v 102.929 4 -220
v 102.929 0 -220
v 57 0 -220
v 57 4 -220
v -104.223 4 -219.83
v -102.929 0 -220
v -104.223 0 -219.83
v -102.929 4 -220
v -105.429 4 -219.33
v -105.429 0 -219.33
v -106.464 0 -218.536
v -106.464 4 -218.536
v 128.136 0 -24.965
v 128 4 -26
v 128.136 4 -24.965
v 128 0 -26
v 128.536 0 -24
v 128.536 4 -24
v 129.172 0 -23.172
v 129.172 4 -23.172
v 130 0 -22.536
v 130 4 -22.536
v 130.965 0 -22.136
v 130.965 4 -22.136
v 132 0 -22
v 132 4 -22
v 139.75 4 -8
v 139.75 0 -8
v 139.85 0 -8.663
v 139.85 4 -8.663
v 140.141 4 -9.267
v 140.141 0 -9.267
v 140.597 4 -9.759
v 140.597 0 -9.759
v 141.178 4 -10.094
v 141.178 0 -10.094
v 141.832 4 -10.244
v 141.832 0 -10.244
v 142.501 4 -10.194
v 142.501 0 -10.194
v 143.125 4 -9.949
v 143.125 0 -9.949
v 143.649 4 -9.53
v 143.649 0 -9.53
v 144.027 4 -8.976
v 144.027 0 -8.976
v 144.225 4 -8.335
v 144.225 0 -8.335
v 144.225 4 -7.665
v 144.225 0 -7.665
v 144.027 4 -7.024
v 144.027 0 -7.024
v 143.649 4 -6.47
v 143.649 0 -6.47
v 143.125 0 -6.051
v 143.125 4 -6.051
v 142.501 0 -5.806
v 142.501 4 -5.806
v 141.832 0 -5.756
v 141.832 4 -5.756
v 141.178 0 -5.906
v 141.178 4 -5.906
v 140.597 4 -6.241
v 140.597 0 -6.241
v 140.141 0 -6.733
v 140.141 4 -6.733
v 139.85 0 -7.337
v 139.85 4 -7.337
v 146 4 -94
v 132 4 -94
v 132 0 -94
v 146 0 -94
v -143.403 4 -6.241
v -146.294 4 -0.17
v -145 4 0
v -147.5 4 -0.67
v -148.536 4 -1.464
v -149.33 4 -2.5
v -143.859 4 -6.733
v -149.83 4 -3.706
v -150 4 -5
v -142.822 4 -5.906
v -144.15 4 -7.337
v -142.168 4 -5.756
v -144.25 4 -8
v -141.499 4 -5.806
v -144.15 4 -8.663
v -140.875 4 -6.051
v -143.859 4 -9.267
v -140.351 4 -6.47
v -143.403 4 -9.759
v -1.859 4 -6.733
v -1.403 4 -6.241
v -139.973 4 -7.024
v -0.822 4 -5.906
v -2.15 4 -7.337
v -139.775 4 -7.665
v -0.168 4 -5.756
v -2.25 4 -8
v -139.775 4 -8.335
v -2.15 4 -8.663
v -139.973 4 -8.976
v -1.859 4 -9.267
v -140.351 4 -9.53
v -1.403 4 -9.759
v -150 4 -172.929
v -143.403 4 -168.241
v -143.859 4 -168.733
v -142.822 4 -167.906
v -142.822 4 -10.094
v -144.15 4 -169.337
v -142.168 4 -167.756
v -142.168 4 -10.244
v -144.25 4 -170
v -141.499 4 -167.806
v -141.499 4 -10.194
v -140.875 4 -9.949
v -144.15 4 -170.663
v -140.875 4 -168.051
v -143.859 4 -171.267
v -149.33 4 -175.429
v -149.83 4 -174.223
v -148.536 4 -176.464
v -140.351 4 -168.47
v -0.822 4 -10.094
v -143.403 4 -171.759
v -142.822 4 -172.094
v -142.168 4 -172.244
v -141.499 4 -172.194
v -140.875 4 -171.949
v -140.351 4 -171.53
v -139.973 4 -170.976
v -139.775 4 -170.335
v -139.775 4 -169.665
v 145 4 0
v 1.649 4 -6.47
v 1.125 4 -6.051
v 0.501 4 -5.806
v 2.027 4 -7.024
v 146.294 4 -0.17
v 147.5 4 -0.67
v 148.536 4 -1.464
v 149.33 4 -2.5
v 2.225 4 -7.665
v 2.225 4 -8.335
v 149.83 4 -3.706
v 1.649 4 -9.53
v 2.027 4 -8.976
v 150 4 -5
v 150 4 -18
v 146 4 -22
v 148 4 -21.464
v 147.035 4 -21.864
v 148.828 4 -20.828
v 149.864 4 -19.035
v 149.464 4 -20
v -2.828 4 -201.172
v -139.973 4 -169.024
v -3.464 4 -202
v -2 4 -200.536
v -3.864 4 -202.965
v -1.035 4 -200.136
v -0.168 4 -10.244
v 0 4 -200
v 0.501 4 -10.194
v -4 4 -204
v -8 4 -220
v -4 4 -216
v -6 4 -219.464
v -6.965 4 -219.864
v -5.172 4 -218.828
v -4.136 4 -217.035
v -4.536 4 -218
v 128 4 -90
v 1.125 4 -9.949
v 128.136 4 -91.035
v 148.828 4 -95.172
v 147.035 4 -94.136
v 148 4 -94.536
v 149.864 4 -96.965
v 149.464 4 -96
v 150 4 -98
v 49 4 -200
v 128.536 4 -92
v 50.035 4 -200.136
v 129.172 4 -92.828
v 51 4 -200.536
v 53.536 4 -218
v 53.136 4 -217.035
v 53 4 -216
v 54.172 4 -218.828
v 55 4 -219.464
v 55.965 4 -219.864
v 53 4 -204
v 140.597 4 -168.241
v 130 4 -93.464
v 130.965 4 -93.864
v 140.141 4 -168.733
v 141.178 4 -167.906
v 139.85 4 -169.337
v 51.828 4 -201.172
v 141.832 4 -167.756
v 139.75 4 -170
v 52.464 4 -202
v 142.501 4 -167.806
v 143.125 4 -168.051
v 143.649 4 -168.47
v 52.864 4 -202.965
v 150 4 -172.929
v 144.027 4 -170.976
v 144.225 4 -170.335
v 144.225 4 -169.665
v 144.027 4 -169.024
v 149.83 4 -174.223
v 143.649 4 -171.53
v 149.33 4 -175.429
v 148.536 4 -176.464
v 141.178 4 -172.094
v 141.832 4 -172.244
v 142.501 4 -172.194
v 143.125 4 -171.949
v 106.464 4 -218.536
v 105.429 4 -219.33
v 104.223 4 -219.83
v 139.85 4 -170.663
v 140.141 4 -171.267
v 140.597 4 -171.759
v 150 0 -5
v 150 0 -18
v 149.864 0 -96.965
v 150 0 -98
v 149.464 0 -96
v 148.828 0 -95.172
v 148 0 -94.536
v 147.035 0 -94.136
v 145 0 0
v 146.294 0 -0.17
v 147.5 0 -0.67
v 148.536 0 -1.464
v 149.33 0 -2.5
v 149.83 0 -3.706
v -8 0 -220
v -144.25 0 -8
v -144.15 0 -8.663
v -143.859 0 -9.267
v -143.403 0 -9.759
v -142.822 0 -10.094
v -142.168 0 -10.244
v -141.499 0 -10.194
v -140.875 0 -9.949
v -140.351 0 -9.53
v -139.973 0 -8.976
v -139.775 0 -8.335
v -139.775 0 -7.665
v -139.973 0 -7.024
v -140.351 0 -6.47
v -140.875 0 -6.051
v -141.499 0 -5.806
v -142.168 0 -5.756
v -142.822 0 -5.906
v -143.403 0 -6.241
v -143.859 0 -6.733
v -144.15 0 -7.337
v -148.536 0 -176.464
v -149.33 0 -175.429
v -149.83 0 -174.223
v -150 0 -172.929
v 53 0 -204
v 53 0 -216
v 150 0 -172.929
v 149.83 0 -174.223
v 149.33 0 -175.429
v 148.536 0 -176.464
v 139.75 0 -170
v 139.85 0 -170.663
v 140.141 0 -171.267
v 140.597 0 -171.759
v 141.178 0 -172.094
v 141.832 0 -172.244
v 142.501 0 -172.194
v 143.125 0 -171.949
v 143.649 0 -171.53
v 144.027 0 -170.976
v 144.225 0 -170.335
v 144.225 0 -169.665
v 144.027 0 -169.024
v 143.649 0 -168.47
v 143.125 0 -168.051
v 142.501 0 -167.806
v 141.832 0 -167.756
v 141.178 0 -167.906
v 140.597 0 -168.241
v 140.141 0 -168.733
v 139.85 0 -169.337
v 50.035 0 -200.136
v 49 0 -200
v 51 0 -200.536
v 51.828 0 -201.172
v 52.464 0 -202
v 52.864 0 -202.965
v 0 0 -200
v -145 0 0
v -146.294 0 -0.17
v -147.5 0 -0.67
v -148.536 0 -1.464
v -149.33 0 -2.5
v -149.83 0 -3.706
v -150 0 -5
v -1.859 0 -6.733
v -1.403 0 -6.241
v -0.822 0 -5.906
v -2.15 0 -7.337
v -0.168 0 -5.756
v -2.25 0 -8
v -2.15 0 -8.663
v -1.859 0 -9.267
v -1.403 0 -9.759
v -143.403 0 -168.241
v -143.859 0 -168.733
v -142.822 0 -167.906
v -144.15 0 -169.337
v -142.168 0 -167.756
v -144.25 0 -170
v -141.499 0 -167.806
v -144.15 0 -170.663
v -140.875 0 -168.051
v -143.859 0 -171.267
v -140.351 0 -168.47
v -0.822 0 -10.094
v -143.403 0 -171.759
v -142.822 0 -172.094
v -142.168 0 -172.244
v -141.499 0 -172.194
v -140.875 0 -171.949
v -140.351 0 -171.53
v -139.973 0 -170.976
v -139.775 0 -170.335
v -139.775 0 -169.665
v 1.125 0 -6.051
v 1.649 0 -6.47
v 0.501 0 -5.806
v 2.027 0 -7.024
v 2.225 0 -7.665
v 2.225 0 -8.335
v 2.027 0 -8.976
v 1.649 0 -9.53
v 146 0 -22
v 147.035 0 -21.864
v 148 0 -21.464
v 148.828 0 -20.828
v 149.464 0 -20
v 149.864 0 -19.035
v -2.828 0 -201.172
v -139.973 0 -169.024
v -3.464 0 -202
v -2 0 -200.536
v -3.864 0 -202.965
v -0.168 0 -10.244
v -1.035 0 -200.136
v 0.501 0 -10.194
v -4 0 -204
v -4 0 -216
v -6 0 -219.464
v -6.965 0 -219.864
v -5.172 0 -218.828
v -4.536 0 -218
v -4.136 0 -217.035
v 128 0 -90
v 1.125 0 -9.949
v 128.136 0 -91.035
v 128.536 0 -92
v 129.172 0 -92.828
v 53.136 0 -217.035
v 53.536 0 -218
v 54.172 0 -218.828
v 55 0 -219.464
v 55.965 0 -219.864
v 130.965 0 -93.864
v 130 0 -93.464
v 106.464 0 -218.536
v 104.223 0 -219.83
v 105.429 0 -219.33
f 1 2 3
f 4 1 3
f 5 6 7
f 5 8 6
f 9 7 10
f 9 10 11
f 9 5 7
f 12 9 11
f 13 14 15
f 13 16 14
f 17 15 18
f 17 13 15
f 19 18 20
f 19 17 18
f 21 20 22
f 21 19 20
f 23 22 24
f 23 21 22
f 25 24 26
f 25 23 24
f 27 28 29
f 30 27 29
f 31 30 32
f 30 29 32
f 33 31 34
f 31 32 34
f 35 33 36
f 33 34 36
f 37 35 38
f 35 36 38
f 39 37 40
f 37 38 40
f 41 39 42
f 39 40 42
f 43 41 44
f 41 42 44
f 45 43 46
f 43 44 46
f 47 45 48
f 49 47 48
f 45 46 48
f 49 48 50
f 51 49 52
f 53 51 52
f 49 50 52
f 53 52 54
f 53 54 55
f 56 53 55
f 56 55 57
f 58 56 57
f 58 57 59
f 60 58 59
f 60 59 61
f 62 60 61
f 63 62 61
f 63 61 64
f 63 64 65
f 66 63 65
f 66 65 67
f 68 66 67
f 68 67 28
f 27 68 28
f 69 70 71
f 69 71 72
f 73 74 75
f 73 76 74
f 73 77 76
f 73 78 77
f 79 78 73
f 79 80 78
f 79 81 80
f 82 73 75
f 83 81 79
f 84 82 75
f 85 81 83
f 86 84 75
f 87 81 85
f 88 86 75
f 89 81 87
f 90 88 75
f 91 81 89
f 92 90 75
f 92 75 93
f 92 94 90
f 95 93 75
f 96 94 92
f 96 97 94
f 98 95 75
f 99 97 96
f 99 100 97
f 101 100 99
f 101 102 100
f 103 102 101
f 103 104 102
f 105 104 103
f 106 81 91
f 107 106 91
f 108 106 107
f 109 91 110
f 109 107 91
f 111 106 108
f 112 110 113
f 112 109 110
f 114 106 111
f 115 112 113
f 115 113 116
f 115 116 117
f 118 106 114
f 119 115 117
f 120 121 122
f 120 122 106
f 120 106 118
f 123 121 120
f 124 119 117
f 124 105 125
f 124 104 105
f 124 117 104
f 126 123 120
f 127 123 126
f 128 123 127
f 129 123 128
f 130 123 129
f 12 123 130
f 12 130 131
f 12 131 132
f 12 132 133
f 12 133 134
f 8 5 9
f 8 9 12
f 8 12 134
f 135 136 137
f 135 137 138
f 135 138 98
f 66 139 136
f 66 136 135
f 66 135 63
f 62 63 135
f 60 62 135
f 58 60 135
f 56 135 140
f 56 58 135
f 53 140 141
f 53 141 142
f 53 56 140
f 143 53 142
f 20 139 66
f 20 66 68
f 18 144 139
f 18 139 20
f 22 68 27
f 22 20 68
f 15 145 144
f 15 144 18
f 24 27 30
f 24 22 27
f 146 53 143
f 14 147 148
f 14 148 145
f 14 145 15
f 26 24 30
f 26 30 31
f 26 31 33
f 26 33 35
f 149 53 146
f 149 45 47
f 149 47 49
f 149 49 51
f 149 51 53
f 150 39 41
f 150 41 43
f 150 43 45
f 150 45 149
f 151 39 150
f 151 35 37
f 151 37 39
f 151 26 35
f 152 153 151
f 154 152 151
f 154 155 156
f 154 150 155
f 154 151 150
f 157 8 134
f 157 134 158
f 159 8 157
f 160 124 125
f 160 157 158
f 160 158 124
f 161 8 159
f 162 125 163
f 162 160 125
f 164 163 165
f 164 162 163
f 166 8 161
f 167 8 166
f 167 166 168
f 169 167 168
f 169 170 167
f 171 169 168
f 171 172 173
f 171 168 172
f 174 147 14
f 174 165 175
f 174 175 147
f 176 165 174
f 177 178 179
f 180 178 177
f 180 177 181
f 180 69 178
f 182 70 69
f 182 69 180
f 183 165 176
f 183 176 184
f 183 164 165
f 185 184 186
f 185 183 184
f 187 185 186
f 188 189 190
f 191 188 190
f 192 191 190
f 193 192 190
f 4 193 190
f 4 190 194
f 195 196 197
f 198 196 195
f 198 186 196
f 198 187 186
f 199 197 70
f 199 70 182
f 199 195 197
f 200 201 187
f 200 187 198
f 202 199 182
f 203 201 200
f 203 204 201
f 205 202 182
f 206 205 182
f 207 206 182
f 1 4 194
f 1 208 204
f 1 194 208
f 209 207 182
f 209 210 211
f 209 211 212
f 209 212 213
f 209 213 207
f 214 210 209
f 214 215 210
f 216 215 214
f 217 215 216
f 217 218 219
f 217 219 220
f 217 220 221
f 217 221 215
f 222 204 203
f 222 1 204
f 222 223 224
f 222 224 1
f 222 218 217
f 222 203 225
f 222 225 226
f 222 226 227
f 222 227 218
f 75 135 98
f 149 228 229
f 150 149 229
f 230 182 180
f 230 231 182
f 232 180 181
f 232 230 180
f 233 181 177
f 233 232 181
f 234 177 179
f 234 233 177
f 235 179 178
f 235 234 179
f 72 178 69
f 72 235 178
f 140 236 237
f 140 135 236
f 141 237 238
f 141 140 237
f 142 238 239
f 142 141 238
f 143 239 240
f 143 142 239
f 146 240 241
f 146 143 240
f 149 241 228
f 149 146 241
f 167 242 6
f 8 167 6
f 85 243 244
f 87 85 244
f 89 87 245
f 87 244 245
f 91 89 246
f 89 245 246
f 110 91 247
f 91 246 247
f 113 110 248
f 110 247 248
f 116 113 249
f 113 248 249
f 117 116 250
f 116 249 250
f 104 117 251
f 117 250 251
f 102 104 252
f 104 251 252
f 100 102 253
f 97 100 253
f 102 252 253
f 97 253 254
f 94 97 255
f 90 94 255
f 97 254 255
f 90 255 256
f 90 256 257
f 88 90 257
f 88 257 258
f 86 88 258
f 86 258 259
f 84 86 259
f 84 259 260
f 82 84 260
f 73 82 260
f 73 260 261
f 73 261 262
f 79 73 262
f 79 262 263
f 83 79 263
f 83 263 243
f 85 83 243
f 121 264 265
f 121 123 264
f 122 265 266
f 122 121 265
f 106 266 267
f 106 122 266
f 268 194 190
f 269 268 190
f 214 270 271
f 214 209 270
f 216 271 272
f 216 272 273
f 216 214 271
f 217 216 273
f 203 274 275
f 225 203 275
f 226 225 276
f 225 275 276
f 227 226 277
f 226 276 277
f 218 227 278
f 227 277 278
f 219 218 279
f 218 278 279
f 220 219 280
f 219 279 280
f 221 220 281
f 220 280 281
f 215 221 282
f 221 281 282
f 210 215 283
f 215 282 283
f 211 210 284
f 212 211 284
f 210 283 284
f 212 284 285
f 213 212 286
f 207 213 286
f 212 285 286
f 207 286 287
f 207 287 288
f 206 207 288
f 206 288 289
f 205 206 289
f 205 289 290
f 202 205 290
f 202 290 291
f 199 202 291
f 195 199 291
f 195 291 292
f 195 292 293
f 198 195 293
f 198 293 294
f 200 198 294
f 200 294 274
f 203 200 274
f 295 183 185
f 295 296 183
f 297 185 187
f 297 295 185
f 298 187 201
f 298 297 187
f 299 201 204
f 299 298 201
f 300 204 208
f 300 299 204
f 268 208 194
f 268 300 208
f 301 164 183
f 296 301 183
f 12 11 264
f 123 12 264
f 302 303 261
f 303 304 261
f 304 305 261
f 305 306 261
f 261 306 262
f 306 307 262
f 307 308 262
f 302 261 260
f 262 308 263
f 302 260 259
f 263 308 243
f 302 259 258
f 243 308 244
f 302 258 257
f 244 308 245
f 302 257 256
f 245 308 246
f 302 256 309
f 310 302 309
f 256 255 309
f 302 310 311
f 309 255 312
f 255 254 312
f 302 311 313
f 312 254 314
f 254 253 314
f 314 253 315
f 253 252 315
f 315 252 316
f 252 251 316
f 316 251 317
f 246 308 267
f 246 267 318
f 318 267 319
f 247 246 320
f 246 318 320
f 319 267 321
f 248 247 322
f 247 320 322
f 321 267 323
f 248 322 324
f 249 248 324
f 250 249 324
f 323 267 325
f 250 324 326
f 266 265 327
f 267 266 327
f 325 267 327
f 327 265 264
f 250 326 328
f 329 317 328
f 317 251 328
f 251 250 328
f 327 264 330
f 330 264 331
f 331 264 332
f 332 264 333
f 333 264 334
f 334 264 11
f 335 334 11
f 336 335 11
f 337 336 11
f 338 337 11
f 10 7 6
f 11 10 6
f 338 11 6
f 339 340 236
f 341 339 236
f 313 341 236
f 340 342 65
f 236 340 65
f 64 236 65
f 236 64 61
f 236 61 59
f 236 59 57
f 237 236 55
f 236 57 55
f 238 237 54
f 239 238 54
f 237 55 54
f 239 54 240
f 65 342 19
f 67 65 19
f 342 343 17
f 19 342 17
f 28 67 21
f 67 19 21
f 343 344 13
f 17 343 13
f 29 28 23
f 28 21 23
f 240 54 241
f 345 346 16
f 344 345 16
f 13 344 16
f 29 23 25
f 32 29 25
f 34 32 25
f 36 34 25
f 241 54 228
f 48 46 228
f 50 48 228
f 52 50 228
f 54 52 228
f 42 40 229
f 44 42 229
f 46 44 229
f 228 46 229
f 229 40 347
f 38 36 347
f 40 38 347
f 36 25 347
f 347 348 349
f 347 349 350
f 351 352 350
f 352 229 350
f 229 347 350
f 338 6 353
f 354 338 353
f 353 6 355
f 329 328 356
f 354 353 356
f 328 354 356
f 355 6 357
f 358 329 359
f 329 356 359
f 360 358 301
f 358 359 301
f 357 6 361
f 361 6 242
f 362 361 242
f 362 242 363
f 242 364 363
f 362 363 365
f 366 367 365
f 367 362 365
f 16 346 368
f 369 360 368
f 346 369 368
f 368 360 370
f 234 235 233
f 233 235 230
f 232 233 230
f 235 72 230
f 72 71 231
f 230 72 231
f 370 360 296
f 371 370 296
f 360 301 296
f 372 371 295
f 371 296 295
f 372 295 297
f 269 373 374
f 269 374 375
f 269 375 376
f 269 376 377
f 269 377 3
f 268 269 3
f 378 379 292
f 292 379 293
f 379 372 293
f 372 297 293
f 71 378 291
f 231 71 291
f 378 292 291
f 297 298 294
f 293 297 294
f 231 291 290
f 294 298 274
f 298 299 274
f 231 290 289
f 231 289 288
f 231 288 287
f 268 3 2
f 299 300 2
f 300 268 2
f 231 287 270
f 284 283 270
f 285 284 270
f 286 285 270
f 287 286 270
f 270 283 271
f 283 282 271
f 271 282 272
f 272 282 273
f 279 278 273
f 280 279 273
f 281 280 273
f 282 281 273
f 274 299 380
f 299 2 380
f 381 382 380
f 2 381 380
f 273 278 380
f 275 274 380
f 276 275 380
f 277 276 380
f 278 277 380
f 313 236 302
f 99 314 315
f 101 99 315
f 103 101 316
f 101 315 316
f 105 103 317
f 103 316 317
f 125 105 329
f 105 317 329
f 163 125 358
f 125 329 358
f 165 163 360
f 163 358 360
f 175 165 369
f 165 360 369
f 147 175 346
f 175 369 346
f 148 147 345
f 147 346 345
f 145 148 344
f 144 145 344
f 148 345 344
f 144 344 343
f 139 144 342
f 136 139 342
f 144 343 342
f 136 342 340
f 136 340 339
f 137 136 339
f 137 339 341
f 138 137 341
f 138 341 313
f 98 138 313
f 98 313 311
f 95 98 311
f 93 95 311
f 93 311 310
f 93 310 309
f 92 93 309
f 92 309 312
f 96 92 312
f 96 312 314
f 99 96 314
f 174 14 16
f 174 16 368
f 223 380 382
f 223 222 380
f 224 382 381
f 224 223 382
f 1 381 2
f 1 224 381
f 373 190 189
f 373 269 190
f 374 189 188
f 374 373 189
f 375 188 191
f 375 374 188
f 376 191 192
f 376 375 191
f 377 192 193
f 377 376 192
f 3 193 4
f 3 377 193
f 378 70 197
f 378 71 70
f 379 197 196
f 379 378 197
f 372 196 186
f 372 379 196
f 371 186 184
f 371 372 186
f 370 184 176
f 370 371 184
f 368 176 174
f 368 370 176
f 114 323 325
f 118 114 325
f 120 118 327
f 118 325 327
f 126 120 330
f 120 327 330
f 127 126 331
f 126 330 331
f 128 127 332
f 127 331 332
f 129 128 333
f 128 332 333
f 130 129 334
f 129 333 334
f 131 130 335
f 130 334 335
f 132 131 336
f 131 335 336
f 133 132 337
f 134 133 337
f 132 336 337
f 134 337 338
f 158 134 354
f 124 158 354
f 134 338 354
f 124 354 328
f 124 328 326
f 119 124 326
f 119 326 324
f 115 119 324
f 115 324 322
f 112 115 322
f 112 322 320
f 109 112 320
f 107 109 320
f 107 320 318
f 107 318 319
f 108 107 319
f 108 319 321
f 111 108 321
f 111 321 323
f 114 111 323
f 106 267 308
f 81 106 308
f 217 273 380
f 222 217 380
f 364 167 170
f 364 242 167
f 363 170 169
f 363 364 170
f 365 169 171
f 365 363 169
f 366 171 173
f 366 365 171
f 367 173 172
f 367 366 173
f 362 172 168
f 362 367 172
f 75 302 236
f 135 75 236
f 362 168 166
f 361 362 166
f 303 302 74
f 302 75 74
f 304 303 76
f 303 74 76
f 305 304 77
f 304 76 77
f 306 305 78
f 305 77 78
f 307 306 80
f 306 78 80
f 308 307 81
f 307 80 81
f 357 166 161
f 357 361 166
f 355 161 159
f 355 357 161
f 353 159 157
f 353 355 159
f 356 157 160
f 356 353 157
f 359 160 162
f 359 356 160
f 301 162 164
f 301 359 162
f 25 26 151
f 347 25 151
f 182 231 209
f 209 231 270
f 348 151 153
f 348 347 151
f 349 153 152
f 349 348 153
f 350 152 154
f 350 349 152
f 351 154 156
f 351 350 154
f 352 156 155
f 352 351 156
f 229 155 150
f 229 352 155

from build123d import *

# Parameters (mm, degrees)
MAIN_EXTRUSION_DEPTH    = 4
CORNER_LEAVE_R          = 5
D_GAGEMENT_M41_D        = 4.5
ESQUISSE4_W             = 22
ESQUISSE4_H             = 72
ENL_V_MAT_EXTRU_1_DEPTH = 4
ENL_V_MAT_EXTRU_2_DEPTH = 4
CONG_1_R                = 4


with BuildPart() as part:
    # Main scetch → Main extrusion (new body)
    with BuildSketch(Plane(origin=(0, 0, 0), x_dir=(1, 0, 0), z_dir=(0, 1, 0))):
        Polygon((-150, 0), (150, 0), (150, 175), (105, 220), (-105, 220), (-150, 175), align=None)
    extrude(amount=MAIN_EXTRUSION_DEPTH)

    # Corner leave
    corner_leave_edges = [part.edges().sort_by_distance(p)[0] for p in [
        (150, 2, 0),
        (-150, 2, 0),
        (-150, 2, -175),
        (-105, 2, -220),
        (105, 2, -220),
        (150, 2, -175),
    ]]
    fillet(corner_leave_edges, radius=CORNER_LEAVE_R)

    # Dégagement M41 (through all)
    with Locations(Plane(origin=(0, 4, 0), x_dir=(1, 0, 0), z_dir=(0, 1, 0))):
        with Locations((-142, 8), (-142, 170), (142, 170), (142, 8), (0, 8)):
            Hole(D_GAGEMENT_M41_D / 2)

    # Esquisse4 → Enlèv. mat.-Extru.1 (cut)
    with BuildSketch(Plane(origin=(0, 4, 0), x_dir=(1, 0, 0), z_dir=(0, 1, 0))):
        with Locations((139, 58)):
            Rectangle(ESQUISSE4_W, ESQUISSE4_H)
    extrude(amount=-ENL_V_MAT_EXTRU_1_DEPTH, mode=Mode.SUBTRACT)

    # Esquisse5 → Enlèv. mat.-Extru.2 (cut)
    with BuildSketch(Plane(origin=(0, 4, 0), x_dir=(1, 0, 0), z_dir=(0, 1, 0))):
        Polygon((36.3, 200), (53, 200), (53, 220), (-4, 220), (-4, 200), align=None)
    extrude(amount=-ENL_V_MAT_EXTRU_2_DEPTH, mode=Mode.SUBTRACT)

    # Congé1
    cong_1_edges = [part.edges().sort_by_distance(p)[0] for p in [
        (150, 2, -94),
        (150, 2, -22),
        (128, 2, -22),
        (128, 2, -94),
        (53, 2, -220),
        (53, 2, -200),
        (-4, 2, -200),
        (-4, 2, -220),
    ]]
    fillet(cong_1_edges, radius=CONG_1_R)


solid = part.part
